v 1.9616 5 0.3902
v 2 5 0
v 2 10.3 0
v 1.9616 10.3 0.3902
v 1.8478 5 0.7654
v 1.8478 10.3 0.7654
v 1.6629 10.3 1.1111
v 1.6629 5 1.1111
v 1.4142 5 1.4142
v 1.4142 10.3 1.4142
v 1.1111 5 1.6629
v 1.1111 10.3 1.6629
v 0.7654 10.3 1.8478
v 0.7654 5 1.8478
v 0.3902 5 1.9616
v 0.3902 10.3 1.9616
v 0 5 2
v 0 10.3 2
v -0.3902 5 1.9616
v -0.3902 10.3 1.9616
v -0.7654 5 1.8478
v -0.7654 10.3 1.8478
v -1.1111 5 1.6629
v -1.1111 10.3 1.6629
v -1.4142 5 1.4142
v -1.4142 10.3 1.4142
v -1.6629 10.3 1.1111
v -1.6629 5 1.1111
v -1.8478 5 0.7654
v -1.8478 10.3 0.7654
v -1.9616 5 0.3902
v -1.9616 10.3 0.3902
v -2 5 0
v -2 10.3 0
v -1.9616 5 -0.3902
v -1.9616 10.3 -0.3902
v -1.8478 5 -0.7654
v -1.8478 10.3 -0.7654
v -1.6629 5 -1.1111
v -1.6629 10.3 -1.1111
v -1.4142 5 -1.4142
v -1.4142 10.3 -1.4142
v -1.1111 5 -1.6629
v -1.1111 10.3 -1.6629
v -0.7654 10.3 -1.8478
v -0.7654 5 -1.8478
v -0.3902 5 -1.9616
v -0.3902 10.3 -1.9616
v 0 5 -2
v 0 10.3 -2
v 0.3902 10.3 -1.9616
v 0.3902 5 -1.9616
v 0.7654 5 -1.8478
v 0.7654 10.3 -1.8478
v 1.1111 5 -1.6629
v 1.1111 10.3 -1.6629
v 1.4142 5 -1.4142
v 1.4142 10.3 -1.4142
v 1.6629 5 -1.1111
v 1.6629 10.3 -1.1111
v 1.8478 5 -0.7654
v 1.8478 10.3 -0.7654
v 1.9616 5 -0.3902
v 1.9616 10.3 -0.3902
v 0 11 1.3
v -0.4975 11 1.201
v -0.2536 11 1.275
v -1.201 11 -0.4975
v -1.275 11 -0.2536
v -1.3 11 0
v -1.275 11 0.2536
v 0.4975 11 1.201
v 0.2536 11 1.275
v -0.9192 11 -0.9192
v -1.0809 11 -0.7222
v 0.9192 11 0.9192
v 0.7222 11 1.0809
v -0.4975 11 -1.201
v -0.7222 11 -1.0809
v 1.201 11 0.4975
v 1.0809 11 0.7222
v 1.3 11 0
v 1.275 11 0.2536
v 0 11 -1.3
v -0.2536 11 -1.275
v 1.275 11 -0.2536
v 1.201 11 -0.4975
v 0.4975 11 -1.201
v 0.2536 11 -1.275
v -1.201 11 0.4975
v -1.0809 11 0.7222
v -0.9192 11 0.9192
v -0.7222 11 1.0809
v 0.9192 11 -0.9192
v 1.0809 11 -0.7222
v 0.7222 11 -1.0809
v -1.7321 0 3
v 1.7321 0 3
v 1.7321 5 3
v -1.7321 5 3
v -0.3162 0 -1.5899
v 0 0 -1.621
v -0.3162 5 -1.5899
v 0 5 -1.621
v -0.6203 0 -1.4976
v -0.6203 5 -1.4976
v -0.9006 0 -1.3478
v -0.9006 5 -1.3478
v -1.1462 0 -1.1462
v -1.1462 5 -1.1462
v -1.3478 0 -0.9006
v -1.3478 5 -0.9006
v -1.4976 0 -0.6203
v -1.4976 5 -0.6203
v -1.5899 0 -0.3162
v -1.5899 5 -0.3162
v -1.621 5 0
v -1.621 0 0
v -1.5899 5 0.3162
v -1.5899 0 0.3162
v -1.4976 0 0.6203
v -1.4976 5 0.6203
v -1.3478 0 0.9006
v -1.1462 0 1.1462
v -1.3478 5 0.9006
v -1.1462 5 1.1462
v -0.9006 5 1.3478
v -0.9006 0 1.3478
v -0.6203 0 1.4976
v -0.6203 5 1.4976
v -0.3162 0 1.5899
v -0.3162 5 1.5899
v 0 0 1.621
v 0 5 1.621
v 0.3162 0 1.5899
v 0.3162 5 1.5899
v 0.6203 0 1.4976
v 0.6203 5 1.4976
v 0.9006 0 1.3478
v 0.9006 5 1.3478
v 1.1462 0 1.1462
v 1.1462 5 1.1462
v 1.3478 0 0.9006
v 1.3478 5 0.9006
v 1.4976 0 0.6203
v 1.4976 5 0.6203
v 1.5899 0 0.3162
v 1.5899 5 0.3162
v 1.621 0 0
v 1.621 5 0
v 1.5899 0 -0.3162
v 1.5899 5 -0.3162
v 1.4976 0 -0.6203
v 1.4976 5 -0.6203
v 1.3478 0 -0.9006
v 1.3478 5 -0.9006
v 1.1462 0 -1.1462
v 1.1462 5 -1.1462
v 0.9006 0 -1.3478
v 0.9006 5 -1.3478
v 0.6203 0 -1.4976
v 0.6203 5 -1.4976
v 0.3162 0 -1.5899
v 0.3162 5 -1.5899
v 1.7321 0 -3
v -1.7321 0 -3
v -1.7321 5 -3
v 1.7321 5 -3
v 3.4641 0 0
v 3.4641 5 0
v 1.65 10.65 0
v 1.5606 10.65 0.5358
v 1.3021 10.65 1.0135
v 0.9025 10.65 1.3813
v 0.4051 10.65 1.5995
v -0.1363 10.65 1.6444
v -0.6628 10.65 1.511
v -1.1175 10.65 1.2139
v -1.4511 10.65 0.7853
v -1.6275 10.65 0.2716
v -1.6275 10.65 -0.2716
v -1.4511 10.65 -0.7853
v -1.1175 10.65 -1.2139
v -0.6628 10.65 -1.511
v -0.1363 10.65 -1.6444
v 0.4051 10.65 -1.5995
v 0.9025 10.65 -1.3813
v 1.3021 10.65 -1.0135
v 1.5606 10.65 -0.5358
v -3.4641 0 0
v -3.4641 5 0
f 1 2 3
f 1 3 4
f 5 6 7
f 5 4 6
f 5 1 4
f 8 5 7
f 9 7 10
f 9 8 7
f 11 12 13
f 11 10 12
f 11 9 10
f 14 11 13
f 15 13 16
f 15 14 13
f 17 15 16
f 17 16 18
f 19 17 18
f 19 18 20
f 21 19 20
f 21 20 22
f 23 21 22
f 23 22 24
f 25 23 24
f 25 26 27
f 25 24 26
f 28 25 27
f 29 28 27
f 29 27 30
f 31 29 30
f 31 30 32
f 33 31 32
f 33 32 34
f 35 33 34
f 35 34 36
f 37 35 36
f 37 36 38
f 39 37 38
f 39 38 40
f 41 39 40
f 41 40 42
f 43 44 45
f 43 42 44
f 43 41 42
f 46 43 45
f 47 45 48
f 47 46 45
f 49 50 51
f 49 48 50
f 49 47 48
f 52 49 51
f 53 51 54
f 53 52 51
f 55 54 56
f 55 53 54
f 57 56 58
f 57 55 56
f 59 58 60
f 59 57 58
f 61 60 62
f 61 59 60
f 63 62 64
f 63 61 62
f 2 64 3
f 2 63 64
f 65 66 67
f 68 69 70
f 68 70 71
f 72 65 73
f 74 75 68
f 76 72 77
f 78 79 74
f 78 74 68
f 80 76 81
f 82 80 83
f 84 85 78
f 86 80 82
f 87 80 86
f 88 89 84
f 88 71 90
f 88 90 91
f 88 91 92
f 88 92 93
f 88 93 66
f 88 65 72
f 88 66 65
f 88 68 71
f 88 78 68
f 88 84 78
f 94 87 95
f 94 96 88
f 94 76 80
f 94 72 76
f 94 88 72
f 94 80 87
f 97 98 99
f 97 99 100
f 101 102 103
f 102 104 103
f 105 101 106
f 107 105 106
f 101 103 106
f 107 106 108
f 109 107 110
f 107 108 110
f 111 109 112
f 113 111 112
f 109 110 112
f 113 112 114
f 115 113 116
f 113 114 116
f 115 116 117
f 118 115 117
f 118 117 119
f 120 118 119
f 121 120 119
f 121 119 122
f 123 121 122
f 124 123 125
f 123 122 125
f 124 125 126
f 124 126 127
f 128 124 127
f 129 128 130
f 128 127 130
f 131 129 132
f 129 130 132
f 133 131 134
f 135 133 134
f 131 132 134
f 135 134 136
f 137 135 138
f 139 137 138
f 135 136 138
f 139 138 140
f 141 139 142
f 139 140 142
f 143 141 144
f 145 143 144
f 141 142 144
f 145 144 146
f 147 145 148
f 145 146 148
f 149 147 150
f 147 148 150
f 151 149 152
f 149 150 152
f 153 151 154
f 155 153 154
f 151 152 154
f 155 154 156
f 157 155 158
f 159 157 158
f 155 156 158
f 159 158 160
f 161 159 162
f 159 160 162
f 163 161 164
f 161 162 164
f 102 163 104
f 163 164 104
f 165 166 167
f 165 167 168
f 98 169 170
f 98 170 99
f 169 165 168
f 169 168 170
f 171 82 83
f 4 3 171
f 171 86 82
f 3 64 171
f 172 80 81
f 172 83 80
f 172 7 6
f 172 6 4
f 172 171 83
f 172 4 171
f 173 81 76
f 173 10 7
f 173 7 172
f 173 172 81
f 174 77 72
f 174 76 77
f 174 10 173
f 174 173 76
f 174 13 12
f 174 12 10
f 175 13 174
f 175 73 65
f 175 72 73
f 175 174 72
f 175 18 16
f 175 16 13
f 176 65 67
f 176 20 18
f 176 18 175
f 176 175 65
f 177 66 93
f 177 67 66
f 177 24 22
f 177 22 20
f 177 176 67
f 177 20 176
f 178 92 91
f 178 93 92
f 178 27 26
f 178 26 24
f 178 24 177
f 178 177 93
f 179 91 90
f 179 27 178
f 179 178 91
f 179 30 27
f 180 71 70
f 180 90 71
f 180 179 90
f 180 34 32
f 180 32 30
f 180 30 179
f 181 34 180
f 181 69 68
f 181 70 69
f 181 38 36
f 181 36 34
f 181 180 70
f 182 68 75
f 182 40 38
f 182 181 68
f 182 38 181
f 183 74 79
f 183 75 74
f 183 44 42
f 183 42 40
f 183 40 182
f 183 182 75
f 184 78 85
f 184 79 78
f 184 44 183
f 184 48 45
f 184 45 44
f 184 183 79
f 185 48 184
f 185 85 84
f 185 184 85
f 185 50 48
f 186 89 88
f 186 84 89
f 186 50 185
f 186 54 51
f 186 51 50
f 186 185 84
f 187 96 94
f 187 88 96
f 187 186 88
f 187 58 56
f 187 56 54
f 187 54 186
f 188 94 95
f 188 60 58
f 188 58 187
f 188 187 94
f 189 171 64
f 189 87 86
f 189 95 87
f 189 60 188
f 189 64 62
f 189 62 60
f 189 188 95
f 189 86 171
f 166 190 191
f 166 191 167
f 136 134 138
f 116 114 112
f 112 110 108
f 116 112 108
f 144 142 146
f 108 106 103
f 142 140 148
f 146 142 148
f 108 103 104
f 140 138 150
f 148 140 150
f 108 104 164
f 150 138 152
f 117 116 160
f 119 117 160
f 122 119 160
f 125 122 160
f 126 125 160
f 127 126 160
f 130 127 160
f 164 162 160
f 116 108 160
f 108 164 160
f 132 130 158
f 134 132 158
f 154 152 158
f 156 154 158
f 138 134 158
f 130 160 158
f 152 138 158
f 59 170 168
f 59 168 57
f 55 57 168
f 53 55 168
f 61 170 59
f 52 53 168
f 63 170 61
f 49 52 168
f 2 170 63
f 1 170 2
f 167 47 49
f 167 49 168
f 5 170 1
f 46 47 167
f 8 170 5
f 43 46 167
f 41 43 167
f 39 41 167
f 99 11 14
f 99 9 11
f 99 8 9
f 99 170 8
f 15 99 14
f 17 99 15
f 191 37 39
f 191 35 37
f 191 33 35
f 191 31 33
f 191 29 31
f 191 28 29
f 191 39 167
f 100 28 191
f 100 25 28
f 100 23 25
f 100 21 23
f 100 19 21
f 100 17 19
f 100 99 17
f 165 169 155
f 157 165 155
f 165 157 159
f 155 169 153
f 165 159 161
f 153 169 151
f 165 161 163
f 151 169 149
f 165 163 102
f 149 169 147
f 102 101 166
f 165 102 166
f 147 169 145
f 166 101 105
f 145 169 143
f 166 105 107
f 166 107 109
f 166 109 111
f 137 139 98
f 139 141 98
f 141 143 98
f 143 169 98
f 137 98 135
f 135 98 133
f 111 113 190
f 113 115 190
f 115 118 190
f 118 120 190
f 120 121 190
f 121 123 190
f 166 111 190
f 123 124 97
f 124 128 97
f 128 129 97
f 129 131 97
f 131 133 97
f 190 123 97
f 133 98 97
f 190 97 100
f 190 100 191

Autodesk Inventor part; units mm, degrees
ref_plane "YZ Plane" through (0, 0, 0) normal (1, 0, 0) x (0, 1, 0)
ref_plane "XZ Plane" through (0, 0, 0) normal (0, 1, 0) x (-1, 0, 0)
ref_plane "XY Plane" through (0, 0, 0) normal (0, 0, 1) x (1, 0, 0)
sketch "Sketch1" plane through (0, 0, 0) normal (0, 1, 0) x (-1, 0, 0)
  line L0 (-1.7321, -3) -> (-3.4641, 0)
  line L1 (-3.4641, 0) -> (-1.7321, 3)
  line L2 (-1.7321, 3) -> (1.7321, 3)
  line L3 (1.7321, 3) -> (3.4641, 0)
  line L4 (3.4641, 0) -> (1.7321, -3)
  line L5 (1.7321, -3) -> (-1.7321, -3)
  point P0 (0, 0)
  point P1 (0, 0)
  point P2 (0, 0)
  dimension "d0" = 3
extrude "Extrusion1" add sketch "Sketch1" along normal blind 5
hole "Hole2" at (0, 0, 0) direction (0, 1, 0) diameter 3.242 depth 11.8 tip angle 118 thread size "M4x0.7" class "6H" standard "ISO Metric profile"
sketch "Sketch3" plane through (0, 5, 0) normal (0, 1, 0) x (1, 0, 0)
  circle A0 centre (0, 0) radius 2
  dimension "d17" = 4
extrude "Extrusion2" add sketch "Sketch3" along normal blind 6
thread "Thread1" size "M4x0.7" class "6g" standard "ANSI Metric M Profile" length 5
chamfer "Chamfer1" distance 0.7 angle 45 1 edges at (-2, 11, 0)
properties part number "StandoffM4x15B" material "Brass, Soft Yellow"
